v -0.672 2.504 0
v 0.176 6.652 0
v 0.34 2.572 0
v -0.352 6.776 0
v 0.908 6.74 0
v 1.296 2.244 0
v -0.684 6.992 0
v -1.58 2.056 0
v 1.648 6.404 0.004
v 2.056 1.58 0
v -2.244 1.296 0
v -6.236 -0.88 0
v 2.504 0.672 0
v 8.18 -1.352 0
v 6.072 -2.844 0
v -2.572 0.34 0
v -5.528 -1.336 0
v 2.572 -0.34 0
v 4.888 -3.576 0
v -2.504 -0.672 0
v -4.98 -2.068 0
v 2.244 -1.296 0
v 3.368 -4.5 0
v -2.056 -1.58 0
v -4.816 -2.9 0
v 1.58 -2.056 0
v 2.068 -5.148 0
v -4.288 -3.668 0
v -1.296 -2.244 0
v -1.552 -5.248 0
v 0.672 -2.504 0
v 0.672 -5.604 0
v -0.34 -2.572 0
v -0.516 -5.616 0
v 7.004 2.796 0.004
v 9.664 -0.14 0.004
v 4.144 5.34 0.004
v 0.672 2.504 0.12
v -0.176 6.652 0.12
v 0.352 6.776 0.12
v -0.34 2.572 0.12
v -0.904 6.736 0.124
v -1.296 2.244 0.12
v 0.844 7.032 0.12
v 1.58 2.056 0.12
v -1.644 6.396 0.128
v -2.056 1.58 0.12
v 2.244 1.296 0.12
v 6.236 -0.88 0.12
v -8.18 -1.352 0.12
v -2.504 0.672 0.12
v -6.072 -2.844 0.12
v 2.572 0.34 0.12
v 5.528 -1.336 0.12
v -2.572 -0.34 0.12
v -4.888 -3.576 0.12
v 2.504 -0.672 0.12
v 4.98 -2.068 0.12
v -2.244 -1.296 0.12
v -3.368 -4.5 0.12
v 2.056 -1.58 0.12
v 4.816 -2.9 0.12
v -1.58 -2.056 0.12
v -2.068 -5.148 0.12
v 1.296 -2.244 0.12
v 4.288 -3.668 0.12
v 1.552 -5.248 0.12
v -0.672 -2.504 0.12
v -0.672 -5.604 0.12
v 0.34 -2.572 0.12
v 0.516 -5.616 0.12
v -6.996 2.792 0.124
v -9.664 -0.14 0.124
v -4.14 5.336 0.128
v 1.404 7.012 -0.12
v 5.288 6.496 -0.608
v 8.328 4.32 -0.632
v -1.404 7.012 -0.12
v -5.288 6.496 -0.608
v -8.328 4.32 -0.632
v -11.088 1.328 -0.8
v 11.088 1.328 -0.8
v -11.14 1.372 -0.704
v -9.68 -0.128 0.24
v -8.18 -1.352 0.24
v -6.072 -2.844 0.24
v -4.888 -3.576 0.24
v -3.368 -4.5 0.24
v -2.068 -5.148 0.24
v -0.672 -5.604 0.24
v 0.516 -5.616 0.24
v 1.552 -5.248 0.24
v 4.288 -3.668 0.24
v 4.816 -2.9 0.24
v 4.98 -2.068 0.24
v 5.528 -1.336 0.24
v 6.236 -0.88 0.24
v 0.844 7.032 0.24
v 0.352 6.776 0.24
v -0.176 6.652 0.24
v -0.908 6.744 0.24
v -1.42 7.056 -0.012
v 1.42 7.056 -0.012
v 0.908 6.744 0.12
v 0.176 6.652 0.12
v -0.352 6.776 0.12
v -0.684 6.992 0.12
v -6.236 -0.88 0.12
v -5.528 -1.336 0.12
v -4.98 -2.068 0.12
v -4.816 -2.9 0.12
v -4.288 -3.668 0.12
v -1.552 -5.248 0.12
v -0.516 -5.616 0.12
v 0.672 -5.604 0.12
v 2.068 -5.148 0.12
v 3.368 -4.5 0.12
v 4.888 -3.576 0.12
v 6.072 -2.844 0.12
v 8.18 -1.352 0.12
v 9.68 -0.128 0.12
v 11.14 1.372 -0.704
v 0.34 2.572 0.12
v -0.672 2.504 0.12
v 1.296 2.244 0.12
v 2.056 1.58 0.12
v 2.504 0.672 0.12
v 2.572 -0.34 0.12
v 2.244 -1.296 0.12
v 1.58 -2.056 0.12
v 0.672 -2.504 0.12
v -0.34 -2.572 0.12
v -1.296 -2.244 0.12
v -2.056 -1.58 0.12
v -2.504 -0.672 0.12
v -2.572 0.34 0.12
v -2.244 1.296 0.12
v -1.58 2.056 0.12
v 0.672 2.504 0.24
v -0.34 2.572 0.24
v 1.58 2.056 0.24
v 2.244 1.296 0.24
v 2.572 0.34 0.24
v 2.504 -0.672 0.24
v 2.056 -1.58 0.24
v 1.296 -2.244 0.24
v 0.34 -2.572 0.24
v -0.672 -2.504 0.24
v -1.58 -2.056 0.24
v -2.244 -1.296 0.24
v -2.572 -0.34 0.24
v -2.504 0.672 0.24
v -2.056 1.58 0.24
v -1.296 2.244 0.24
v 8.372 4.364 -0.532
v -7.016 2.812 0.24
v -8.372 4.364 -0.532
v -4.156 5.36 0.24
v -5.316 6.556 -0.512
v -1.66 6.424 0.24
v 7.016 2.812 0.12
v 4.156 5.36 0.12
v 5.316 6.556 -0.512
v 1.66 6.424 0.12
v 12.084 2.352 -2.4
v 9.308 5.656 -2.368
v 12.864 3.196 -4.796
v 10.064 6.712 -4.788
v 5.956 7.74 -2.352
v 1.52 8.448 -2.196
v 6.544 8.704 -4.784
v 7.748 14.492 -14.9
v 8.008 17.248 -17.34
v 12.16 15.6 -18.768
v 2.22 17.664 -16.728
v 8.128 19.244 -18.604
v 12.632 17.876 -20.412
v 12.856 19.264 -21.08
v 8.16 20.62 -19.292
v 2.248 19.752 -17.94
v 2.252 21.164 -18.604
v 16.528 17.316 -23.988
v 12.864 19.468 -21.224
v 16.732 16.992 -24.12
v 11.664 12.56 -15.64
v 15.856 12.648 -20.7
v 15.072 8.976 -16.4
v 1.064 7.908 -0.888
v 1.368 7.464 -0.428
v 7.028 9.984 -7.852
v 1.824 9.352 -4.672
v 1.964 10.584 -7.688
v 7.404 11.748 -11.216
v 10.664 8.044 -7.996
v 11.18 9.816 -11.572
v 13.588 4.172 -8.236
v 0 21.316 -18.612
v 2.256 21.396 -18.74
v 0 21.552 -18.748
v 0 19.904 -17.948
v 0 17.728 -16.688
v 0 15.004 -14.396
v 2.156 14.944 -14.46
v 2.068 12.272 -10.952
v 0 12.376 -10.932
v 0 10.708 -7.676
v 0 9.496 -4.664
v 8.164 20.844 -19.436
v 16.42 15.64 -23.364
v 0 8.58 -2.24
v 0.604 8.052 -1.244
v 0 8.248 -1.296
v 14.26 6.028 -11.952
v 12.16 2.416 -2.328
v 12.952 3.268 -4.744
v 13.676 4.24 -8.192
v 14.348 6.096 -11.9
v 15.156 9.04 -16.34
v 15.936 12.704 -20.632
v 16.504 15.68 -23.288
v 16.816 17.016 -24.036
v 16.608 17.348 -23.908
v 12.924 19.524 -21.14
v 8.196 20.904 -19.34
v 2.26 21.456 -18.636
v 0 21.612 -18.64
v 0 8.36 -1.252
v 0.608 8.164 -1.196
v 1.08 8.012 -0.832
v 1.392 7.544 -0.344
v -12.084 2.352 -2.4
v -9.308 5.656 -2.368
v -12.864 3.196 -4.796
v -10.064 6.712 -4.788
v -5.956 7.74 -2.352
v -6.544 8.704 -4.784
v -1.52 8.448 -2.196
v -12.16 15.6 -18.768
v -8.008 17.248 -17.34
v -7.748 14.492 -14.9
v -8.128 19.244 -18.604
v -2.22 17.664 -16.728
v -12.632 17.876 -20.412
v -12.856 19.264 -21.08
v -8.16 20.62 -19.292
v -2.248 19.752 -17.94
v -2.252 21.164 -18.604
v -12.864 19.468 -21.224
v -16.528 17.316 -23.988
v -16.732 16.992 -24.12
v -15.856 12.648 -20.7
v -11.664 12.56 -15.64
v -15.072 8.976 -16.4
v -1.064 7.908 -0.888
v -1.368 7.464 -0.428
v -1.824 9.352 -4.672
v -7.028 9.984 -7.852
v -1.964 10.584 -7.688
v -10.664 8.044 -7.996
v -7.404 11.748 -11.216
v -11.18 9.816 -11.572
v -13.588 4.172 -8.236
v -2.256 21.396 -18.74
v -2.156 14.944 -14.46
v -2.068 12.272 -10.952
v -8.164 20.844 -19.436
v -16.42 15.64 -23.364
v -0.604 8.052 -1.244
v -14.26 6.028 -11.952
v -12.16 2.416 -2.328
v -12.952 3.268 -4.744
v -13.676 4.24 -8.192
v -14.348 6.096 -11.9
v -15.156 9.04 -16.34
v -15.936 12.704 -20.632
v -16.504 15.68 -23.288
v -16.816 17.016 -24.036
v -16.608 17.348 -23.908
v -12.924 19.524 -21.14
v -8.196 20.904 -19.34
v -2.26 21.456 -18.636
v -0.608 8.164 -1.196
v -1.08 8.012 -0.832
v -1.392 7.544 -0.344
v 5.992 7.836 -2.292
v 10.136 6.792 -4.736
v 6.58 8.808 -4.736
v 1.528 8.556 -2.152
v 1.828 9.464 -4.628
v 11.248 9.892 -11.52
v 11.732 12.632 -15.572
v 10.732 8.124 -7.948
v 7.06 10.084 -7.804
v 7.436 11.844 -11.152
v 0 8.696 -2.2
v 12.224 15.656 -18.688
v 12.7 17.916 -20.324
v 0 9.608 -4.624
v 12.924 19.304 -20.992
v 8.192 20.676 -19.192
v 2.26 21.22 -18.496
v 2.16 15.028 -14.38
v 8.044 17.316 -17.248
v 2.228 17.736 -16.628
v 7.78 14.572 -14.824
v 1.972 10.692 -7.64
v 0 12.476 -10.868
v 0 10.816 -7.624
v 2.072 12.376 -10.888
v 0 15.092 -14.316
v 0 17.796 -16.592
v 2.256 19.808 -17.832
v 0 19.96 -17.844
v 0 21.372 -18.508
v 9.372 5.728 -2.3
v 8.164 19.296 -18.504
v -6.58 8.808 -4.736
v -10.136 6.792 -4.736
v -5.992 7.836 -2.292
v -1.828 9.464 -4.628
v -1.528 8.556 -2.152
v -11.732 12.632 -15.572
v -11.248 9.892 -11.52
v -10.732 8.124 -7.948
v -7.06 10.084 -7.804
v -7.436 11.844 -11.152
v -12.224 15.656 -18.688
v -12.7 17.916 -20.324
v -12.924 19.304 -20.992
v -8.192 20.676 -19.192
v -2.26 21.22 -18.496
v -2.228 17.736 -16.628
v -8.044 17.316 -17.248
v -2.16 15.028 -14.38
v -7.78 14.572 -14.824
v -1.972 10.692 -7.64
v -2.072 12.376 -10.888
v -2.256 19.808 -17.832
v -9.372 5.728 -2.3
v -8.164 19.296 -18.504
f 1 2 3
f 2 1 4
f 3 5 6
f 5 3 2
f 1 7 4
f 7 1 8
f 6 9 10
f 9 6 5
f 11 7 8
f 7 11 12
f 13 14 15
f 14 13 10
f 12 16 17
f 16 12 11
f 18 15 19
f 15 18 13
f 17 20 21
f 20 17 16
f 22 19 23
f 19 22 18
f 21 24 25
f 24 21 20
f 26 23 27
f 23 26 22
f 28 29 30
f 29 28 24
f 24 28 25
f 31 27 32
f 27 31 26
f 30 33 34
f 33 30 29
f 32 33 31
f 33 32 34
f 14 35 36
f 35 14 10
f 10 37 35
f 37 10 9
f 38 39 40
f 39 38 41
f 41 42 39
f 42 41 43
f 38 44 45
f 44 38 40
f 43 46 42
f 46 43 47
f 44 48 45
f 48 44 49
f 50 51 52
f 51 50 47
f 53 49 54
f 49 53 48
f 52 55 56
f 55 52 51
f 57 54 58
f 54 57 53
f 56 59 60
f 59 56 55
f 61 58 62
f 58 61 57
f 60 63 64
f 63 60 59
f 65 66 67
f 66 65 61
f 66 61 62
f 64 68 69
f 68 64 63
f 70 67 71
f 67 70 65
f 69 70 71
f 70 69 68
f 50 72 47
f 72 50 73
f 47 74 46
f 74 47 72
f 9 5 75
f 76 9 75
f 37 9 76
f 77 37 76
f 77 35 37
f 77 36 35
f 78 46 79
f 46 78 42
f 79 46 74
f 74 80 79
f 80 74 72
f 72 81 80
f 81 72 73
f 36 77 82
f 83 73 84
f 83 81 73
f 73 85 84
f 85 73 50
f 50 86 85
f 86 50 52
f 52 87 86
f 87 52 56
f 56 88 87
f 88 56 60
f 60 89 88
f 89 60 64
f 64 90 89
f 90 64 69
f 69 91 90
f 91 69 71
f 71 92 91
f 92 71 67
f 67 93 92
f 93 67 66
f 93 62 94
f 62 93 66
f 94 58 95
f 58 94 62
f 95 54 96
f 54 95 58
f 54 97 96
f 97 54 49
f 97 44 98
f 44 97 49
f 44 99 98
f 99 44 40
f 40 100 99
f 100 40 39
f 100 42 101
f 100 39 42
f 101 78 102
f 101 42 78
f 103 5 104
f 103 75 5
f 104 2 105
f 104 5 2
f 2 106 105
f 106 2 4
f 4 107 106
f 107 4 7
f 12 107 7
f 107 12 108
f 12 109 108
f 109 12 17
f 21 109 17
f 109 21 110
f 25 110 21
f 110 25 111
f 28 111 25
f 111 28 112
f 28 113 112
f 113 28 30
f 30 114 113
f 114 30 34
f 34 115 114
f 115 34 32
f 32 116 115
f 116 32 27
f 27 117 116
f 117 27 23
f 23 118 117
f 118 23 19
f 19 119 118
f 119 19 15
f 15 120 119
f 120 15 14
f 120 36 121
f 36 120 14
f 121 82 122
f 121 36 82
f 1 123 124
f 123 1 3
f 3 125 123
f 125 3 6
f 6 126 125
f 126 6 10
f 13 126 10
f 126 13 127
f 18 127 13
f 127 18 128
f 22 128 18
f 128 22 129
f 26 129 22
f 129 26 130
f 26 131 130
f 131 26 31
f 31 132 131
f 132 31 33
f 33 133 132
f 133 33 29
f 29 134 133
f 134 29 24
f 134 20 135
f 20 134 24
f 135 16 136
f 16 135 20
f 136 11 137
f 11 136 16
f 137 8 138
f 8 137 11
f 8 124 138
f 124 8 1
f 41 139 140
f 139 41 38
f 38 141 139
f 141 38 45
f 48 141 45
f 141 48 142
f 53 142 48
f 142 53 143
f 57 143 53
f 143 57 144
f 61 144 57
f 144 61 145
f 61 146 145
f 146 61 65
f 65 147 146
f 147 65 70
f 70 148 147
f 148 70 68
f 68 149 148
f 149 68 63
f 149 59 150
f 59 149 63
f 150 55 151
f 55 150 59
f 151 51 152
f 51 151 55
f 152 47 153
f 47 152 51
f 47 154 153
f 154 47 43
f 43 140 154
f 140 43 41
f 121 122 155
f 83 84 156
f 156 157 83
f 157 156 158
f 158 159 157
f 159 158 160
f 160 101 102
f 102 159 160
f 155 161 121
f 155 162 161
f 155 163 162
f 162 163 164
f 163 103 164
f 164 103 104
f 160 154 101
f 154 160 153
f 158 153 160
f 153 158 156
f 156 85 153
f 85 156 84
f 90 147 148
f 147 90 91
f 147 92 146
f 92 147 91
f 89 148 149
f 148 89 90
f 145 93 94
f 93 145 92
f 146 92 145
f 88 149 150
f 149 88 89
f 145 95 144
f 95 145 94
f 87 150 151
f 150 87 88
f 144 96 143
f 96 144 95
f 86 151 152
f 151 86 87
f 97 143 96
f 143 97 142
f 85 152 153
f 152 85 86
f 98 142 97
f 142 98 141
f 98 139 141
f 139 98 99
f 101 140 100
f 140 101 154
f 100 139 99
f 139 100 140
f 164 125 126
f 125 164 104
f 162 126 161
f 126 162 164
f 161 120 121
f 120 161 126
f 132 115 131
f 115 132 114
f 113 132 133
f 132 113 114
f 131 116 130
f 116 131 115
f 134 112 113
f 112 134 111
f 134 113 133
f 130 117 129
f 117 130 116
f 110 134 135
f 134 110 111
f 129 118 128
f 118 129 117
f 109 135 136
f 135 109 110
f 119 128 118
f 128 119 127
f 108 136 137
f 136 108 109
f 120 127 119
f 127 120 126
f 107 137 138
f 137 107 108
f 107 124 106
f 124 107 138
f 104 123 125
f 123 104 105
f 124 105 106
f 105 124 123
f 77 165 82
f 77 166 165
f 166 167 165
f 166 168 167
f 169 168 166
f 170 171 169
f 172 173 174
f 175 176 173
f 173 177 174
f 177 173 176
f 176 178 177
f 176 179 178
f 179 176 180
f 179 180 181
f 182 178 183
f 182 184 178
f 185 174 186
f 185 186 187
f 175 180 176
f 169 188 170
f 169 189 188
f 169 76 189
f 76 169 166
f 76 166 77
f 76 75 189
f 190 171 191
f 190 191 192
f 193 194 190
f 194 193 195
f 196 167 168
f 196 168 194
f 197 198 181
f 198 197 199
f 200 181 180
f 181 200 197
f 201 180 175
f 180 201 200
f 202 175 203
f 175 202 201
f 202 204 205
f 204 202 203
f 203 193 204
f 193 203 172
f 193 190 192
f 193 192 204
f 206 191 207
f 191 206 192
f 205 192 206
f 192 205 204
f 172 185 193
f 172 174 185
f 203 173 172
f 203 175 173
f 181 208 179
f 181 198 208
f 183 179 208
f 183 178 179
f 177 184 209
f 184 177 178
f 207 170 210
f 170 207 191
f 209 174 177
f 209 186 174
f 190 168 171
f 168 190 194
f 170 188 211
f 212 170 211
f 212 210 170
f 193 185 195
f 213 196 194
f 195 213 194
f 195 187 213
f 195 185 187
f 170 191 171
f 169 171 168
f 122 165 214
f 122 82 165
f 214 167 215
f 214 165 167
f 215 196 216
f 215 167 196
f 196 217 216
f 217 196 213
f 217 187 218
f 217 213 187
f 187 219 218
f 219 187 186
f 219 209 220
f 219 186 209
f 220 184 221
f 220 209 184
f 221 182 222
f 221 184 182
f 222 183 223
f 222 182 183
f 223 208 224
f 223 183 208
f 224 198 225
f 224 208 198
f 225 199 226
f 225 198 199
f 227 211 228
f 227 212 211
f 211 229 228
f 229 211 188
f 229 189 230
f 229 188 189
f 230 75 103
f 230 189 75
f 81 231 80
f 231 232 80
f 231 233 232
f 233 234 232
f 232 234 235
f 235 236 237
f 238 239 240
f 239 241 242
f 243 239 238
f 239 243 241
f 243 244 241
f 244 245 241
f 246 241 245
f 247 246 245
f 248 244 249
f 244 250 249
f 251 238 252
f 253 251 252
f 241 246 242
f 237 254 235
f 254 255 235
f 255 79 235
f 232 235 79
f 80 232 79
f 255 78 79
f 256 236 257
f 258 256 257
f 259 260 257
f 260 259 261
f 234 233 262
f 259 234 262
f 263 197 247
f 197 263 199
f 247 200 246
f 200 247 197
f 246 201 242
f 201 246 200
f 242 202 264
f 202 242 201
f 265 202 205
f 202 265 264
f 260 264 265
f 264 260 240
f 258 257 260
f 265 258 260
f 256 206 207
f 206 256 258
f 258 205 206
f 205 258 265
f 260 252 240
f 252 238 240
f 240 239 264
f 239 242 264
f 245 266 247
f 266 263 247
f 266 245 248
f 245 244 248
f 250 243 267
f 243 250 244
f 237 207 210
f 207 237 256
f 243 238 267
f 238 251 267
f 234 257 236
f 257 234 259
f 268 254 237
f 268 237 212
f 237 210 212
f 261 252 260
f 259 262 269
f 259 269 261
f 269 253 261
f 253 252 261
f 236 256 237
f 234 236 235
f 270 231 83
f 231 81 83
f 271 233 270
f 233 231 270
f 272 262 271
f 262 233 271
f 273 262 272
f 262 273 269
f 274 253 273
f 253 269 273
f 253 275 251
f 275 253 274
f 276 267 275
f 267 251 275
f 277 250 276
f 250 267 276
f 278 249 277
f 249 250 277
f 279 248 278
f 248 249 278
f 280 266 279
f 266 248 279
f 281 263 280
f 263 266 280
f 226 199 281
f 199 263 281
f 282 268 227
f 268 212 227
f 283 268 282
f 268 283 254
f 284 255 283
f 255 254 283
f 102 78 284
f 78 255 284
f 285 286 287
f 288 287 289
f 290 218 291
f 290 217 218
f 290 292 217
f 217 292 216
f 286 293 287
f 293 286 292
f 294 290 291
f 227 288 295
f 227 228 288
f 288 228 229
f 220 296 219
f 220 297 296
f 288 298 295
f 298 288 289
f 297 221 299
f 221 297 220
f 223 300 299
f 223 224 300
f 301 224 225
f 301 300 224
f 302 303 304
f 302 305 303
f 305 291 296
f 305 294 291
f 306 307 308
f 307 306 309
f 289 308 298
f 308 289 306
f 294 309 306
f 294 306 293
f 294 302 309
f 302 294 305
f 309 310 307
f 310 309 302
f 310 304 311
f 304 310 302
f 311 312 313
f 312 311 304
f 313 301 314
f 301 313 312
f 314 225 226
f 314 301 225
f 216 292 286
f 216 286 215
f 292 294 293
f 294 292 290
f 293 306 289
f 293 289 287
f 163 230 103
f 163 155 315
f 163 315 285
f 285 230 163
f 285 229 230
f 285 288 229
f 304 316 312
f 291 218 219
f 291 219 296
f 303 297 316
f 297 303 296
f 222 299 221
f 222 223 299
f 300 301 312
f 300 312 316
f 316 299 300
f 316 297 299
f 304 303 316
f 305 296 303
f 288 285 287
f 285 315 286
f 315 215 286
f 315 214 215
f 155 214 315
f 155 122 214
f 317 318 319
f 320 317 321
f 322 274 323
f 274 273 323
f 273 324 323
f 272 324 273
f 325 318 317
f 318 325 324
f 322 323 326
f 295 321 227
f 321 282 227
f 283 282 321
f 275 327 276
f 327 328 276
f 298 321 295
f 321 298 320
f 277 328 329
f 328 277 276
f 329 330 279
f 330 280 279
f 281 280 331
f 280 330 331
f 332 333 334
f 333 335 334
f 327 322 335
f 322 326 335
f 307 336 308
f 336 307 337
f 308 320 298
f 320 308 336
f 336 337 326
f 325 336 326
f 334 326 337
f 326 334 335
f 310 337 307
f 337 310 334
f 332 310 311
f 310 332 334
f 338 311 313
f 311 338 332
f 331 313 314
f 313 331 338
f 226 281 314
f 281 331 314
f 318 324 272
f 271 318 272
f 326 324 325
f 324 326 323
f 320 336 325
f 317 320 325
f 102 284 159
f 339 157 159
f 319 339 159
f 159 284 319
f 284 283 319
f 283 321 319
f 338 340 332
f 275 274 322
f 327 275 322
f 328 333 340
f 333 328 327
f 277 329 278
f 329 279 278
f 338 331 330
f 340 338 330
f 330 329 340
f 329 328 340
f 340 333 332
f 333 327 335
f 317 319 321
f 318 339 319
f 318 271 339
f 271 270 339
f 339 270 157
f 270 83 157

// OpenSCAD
use <../lib.scad>
use <s/50231c02s01.scad>
use <s/50231c02s02.scad>
use <s/50231s01.scad>
use <s/50231s02.scad>
function ldraw_lib__50231c02() = [
// 0 Minifig Cape Cloth (Formed Floating)
// 0 Name: 50231c02.dat
// 0 Author: Philippe Hurbain [Philo]
// 0 !LDRAW_ORG Part UPDATE 2019-01
// 0 !LICENSE Licensed under CC BY 4.0 : see CAreadme.txt
// 
// 0 !HELP Place at y = 0 on torso, head at y = -0.6
// 0 !HELP For use with horseman riding poseable horse
// 
// 0 BFC CERTIFY CCW
  [0,"BFC","CERTIFY"],
  [0,"BFC","CCW"],
// 
// 0 !CATEGORY Minifig Neckwear
// 0 !KEYWORDS 522, BrickLink 522, Cloak, Drape, Neckwear, Poncho
// 0 !KEYWORDS Rebrickable 50231, Shawl
// 
// 0 !HISTORY 2014-12-23 [PTadmin] Official Update 2014-02
// 0 !HISTORY 2019-01-26 [cwdee] Update category
// 0 !HISTORY 2019-06-28 [PTadmin] Official Update 2019-01
// 
// 
// 1 16 0 0 0 1 0 0 0 1 0 0 0 1 s\50231s01.dat
  [1,16,0,0,0,1,0,0,0,1,0,0,0,1, ldraw_lib__s__50231s01()],
// 1 16 0 0 0 1 0 0 0 1 0 0 0 1 s\50231s02.dat
  [1,16,0,0,0,1,0,0,0,1,0,0,0,1, ldraw_lib__s__50231s02()],
// 1 16 0 0 0 1 0 0 0 1 0 0 0 1 s\50231c02s01.dat
  [1,16,0,0,0,1,0,0,0,1,0,0,0,1, ldraw_lib__s__50231c02s01()],
// 1 16 0 0 0 -1 0 0 0 1 0 0 0 1 s\50231c02s01.dat
  [1,16,0,0,0,-1,0,0,0,1,0,0,0,1, ldraw_lib__s__50231c02s01()],
// 1 16 0 0 0 1 0 0 0 1 0 0 0 1 s\50231c02s02.dat
  [1,16,0,0,0,1,0,0,0,1,0,0,0,1, ldraw_lib__s__50231c02s02()],
// 1 16 0 0 0 -1 0 0 0 1 0 0 0 1 s\50231c02s02.dat
  [1,16,0,0,0,-1,0,0,0,1,0,0,0,1, ldraw_lib__s__50231c02s02()],
];
module ldraw_lib__50231c02(step=0, col=false, unit=2/5, alt=false, line=0.2, solid=!$preview)
    makepoly(ldraw_lib__50231c02(), step=step, col=col, unit=unit, alt=alt, line=line, solid=solid);
ldraw_lib__50231c02(line=0.2);
